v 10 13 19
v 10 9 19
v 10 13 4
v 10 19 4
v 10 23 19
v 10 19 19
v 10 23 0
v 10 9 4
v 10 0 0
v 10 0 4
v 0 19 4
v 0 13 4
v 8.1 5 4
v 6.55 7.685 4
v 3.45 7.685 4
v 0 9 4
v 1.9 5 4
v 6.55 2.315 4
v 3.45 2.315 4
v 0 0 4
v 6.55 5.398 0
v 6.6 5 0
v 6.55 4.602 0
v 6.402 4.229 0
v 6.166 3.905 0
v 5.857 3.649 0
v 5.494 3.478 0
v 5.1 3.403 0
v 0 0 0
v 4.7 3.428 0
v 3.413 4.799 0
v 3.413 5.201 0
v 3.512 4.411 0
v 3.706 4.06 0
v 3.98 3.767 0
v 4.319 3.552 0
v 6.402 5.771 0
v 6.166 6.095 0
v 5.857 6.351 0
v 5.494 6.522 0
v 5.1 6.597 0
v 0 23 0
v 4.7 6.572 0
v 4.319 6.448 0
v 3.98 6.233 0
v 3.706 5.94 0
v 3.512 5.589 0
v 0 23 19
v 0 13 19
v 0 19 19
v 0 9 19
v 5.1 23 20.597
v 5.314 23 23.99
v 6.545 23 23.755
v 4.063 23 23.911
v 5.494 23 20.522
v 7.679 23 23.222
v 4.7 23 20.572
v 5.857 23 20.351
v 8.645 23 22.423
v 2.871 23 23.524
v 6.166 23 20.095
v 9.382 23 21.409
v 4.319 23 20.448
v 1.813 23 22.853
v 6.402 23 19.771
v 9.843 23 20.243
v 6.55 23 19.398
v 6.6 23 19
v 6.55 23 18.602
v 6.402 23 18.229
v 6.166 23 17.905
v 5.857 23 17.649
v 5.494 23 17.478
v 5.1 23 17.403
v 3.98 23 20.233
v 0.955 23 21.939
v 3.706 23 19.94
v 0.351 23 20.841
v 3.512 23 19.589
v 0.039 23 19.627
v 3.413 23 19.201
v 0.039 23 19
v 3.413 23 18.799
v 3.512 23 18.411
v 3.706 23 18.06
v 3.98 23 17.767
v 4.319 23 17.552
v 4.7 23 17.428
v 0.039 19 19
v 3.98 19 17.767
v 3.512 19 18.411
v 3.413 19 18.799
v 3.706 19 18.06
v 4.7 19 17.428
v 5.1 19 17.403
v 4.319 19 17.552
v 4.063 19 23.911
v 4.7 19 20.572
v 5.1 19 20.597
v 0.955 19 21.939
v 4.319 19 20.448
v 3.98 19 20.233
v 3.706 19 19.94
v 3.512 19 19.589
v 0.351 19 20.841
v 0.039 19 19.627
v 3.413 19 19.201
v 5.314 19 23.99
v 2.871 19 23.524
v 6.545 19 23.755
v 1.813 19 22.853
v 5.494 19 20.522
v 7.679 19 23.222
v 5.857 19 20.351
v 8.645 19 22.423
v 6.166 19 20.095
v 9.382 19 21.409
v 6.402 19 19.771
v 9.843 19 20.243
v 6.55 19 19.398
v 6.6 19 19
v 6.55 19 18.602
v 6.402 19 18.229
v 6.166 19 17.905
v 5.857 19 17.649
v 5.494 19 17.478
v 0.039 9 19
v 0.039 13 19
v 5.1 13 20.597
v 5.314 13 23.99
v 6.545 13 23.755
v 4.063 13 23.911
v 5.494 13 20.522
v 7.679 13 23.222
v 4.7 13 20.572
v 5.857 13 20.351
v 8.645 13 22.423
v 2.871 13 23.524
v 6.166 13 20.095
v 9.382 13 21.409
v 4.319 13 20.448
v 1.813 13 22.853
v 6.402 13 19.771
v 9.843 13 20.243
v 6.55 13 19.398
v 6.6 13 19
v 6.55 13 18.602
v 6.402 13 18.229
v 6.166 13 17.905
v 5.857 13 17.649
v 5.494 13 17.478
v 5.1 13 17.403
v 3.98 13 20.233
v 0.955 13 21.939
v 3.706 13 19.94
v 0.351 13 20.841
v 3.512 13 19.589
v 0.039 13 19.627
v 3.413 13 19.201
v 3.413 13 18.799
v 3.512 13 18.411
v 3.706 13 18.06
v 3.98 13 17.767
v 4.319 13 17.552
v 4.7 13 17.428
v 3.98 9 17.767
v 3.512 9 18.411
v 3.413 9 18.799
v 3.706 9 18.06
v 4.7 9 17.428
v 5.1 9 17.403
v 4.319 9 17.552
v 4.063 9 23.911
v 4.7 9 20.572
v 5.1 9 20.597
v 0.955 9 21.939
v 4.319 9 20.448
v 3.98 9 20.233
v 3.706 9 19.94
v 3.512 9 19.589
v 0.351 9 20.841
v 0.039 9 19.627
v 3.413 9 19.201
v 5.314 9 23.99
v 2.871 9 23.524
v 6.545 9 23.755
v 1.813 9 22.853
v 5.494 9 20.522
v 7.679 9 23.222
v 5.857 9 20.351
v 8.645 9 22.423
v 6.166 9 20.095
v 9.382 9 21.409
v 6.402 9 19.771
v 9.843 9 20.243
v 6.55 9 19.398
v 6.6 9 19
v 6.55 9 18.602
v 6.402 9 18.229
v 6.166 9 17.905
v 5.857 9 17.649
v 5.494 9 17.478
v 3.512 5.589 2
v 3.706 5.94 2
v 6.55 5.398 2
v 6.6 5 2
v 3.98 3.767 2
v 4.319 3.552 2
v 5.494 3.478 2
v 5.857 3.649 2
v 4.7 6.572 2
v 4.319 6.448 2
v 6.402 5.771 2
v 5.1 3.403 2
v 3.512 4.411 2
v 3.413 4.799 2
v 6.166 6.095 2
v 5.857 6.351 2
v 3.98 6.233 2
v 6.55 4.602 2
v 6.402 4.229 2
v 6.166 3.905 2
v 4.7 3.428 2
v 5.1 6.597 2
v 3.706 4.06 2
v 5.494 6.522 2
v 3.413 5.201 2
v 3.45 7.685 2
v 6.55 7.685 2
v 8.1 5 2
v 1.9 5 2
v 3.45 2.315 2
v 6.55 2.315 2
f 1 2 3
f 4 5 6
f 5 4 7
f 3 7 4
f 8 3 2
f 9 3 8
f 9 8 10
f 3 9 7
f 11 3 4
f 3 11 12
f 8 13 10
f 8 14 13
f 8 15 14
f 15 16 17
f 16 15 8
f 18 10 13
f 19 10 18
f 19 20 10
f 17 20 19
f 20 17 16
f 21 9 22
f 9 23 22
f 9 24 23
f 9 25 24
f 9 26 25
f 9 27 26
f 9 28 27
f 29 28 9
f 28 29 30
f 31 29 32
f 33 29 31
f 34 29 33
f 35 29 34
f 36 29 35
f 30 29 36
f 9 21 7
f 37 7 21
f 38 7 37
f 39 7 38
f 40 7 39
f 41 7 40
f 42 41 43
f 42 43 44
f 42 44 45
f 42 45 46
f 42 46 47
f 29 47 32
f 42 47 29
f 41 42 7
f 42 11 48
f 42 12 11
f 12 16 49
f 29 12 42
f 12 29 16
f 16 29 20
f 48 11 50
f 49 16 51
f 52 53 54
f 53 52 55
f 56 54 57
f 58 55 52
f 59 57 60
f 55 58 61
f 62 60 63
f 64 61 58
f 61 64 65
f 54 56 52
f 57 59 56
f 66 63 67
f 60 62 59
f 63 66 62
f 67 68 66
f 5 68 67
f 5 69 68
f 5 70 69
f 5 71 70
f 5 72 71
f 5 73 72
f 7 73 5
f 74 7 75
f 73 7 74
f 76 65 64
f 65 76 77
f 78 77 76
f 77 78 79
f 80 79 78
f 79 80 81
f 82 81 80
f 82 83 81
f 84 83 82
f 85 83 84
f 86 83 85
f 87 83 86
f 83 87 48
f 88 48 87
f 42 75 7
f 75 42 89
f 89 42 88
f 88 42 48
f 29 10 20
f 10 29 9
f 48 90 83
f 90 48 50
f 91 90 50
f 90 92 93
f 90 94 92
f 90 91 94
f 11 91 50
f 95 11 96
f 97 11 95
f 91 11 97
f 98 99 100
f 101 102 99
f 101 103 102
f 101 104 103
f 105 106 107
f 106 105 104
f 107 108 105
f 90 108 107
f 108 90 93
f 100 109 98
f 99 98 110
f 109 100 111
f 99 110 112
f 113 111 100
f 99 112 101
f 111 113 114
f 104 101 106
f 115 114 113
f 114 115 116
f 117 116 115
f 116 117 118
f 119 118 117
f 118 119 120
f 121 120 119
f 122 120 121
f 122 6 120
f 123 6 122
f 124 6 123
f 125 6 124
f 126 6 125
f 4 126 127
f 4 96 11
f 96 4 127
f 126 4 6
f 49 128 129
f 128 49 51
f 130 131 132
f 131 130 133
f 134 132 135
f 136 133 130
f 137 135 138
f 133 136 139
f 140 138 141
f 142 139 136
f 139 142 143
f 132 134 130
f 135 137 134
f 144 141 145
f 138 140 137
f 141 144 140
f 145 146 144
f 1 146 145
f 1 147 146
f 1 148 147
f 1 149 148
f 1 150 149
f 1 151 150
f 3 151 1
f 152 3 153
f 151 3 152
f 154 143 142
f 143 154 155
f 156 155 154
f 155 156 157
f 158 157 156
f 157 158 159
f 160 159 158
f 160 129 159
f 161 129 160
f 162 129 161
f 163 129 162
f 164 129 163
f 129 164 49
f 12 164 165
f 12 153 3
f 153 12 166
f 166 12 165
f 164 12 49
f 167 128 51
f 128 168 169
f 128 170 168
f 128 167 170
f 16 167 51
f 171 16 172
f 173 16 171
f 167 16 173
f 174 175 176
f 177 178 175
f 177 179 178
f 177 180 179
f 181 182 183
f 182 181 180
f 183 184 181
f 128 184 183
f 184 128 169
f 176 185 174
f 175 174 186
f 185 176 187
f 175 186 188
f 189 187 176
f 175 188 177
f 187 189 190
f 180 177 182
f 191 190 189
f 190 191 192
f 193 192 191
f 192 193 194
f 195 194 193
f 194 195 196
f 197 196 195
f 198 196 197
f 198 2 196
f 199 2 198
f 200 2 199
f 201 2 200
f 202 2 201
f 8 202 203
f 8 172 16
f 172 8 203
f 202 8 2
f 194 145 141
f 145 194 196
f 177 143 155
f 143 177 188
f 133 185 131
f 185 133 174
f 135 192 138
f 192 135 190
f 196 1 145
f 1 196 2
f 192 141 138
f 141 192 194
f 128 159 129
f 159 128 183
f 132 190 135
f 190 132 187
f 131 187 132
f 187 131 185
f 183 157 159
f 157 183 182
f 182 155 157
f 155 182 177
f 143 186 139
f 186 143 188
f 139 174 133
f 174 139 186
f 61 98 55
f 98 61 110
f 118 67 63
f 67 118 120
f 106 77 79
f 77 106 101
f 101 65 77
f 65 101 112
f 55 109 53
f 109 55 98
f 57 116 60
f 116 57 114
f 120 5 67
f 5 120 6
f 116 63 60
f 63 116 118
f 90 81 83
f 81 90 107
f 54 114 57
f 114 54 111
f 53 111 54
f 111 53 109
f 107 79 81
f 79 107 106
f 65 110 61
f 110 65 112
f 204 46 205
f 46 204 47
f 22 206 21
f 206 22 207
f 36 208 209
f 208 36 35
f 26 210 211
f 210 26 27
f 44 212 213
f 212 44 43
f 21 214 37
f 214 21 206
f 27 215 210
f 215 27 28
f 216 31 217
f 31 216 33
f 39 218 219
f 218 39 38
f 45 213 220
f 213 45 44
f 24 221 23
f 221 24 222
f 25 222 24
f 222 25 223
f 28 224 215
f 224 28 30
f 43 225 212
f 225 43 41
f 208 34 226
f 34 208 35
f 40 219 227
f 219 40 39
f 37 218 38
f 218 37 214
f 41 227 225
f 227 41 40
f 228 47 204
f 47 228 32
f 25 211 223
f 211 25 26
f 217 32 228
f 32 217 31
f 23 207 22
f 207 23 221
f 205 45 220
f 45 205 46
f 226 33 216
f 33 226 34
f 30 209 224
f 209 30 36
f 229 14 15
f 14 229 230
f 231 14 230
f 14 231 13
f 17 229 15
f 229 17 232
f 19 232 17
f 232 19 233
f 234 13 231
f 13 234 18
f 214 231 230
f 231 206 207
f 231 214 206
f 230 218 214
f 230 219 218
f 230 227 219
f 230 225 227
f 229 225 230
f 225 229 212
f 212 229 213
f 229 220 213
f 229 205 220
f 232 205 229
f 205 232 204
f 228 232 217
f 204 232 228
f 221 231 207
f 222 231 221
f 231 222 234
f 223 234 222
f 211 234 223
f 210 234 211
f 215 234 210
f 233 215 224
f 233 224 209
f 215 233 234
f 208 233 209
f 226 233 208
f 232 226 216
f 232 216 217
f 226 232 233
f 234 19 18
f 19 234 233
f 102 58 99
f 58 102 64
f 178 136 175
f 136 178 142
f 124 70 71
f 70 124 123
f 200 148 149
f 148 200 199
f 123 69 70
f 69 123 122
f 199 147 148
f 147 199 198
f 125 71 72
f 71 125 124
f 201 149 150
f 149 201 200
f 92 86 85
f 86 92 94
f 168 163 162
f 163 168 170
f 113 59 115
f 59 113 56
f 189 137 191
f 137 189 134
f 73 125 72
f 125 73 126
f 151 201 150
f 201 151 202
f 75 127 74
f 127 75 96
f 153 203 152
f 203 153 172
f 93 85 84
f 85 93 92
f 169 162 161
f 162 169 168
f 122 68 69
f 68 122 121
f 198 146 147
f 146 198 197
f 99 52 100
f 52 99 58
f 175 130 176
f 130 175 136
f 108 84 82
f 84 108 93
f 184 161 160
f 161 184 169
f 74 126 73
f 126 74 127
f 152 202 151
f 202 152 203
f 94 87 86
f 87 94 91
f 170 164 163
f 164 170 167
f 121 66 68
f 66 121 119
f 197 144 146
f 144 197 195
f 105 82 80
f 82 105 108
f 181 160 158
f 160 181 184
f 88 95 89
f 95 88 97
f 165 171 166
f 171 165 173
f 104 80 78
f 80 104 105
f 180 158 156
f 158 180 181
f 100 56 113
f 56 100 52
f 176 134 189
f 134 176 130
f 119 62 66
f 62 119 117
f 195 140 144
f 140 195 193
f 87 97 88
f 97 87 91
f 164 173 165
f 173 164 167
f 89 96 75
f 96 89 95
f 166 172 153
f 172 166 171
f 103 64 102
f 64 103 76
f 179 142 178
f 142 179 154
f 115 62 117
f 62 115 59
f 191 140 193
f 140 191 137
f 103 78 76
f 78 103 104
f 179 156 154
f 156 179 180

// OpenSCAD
$fn=25;
module mod1() {
	difference () {
		union () {
			cube ([10,23,4]);
			translate ([0,19,4]) cube ([10,4,15]);
			translate ([0,9,4]) cube ([10,4,15]);
			translate ([5,9,19]) rotate ([-90,0,0]) cylinder (r=5, h=4);
			translate ([5,19,19]) rotate ([-90,0,0]) cylinder (r=5, h=4);
		}
		translate ([5,5,0]) cylinder (r=1.6, h=5);
		translate ([5,5,2]) cylinder (r=3.1, h=5, $fn=6);
		translate ([5,0,19]) rotate ([-90,0,0]) cylinder (r=1.6, h=30);
	}
}

mod1();
